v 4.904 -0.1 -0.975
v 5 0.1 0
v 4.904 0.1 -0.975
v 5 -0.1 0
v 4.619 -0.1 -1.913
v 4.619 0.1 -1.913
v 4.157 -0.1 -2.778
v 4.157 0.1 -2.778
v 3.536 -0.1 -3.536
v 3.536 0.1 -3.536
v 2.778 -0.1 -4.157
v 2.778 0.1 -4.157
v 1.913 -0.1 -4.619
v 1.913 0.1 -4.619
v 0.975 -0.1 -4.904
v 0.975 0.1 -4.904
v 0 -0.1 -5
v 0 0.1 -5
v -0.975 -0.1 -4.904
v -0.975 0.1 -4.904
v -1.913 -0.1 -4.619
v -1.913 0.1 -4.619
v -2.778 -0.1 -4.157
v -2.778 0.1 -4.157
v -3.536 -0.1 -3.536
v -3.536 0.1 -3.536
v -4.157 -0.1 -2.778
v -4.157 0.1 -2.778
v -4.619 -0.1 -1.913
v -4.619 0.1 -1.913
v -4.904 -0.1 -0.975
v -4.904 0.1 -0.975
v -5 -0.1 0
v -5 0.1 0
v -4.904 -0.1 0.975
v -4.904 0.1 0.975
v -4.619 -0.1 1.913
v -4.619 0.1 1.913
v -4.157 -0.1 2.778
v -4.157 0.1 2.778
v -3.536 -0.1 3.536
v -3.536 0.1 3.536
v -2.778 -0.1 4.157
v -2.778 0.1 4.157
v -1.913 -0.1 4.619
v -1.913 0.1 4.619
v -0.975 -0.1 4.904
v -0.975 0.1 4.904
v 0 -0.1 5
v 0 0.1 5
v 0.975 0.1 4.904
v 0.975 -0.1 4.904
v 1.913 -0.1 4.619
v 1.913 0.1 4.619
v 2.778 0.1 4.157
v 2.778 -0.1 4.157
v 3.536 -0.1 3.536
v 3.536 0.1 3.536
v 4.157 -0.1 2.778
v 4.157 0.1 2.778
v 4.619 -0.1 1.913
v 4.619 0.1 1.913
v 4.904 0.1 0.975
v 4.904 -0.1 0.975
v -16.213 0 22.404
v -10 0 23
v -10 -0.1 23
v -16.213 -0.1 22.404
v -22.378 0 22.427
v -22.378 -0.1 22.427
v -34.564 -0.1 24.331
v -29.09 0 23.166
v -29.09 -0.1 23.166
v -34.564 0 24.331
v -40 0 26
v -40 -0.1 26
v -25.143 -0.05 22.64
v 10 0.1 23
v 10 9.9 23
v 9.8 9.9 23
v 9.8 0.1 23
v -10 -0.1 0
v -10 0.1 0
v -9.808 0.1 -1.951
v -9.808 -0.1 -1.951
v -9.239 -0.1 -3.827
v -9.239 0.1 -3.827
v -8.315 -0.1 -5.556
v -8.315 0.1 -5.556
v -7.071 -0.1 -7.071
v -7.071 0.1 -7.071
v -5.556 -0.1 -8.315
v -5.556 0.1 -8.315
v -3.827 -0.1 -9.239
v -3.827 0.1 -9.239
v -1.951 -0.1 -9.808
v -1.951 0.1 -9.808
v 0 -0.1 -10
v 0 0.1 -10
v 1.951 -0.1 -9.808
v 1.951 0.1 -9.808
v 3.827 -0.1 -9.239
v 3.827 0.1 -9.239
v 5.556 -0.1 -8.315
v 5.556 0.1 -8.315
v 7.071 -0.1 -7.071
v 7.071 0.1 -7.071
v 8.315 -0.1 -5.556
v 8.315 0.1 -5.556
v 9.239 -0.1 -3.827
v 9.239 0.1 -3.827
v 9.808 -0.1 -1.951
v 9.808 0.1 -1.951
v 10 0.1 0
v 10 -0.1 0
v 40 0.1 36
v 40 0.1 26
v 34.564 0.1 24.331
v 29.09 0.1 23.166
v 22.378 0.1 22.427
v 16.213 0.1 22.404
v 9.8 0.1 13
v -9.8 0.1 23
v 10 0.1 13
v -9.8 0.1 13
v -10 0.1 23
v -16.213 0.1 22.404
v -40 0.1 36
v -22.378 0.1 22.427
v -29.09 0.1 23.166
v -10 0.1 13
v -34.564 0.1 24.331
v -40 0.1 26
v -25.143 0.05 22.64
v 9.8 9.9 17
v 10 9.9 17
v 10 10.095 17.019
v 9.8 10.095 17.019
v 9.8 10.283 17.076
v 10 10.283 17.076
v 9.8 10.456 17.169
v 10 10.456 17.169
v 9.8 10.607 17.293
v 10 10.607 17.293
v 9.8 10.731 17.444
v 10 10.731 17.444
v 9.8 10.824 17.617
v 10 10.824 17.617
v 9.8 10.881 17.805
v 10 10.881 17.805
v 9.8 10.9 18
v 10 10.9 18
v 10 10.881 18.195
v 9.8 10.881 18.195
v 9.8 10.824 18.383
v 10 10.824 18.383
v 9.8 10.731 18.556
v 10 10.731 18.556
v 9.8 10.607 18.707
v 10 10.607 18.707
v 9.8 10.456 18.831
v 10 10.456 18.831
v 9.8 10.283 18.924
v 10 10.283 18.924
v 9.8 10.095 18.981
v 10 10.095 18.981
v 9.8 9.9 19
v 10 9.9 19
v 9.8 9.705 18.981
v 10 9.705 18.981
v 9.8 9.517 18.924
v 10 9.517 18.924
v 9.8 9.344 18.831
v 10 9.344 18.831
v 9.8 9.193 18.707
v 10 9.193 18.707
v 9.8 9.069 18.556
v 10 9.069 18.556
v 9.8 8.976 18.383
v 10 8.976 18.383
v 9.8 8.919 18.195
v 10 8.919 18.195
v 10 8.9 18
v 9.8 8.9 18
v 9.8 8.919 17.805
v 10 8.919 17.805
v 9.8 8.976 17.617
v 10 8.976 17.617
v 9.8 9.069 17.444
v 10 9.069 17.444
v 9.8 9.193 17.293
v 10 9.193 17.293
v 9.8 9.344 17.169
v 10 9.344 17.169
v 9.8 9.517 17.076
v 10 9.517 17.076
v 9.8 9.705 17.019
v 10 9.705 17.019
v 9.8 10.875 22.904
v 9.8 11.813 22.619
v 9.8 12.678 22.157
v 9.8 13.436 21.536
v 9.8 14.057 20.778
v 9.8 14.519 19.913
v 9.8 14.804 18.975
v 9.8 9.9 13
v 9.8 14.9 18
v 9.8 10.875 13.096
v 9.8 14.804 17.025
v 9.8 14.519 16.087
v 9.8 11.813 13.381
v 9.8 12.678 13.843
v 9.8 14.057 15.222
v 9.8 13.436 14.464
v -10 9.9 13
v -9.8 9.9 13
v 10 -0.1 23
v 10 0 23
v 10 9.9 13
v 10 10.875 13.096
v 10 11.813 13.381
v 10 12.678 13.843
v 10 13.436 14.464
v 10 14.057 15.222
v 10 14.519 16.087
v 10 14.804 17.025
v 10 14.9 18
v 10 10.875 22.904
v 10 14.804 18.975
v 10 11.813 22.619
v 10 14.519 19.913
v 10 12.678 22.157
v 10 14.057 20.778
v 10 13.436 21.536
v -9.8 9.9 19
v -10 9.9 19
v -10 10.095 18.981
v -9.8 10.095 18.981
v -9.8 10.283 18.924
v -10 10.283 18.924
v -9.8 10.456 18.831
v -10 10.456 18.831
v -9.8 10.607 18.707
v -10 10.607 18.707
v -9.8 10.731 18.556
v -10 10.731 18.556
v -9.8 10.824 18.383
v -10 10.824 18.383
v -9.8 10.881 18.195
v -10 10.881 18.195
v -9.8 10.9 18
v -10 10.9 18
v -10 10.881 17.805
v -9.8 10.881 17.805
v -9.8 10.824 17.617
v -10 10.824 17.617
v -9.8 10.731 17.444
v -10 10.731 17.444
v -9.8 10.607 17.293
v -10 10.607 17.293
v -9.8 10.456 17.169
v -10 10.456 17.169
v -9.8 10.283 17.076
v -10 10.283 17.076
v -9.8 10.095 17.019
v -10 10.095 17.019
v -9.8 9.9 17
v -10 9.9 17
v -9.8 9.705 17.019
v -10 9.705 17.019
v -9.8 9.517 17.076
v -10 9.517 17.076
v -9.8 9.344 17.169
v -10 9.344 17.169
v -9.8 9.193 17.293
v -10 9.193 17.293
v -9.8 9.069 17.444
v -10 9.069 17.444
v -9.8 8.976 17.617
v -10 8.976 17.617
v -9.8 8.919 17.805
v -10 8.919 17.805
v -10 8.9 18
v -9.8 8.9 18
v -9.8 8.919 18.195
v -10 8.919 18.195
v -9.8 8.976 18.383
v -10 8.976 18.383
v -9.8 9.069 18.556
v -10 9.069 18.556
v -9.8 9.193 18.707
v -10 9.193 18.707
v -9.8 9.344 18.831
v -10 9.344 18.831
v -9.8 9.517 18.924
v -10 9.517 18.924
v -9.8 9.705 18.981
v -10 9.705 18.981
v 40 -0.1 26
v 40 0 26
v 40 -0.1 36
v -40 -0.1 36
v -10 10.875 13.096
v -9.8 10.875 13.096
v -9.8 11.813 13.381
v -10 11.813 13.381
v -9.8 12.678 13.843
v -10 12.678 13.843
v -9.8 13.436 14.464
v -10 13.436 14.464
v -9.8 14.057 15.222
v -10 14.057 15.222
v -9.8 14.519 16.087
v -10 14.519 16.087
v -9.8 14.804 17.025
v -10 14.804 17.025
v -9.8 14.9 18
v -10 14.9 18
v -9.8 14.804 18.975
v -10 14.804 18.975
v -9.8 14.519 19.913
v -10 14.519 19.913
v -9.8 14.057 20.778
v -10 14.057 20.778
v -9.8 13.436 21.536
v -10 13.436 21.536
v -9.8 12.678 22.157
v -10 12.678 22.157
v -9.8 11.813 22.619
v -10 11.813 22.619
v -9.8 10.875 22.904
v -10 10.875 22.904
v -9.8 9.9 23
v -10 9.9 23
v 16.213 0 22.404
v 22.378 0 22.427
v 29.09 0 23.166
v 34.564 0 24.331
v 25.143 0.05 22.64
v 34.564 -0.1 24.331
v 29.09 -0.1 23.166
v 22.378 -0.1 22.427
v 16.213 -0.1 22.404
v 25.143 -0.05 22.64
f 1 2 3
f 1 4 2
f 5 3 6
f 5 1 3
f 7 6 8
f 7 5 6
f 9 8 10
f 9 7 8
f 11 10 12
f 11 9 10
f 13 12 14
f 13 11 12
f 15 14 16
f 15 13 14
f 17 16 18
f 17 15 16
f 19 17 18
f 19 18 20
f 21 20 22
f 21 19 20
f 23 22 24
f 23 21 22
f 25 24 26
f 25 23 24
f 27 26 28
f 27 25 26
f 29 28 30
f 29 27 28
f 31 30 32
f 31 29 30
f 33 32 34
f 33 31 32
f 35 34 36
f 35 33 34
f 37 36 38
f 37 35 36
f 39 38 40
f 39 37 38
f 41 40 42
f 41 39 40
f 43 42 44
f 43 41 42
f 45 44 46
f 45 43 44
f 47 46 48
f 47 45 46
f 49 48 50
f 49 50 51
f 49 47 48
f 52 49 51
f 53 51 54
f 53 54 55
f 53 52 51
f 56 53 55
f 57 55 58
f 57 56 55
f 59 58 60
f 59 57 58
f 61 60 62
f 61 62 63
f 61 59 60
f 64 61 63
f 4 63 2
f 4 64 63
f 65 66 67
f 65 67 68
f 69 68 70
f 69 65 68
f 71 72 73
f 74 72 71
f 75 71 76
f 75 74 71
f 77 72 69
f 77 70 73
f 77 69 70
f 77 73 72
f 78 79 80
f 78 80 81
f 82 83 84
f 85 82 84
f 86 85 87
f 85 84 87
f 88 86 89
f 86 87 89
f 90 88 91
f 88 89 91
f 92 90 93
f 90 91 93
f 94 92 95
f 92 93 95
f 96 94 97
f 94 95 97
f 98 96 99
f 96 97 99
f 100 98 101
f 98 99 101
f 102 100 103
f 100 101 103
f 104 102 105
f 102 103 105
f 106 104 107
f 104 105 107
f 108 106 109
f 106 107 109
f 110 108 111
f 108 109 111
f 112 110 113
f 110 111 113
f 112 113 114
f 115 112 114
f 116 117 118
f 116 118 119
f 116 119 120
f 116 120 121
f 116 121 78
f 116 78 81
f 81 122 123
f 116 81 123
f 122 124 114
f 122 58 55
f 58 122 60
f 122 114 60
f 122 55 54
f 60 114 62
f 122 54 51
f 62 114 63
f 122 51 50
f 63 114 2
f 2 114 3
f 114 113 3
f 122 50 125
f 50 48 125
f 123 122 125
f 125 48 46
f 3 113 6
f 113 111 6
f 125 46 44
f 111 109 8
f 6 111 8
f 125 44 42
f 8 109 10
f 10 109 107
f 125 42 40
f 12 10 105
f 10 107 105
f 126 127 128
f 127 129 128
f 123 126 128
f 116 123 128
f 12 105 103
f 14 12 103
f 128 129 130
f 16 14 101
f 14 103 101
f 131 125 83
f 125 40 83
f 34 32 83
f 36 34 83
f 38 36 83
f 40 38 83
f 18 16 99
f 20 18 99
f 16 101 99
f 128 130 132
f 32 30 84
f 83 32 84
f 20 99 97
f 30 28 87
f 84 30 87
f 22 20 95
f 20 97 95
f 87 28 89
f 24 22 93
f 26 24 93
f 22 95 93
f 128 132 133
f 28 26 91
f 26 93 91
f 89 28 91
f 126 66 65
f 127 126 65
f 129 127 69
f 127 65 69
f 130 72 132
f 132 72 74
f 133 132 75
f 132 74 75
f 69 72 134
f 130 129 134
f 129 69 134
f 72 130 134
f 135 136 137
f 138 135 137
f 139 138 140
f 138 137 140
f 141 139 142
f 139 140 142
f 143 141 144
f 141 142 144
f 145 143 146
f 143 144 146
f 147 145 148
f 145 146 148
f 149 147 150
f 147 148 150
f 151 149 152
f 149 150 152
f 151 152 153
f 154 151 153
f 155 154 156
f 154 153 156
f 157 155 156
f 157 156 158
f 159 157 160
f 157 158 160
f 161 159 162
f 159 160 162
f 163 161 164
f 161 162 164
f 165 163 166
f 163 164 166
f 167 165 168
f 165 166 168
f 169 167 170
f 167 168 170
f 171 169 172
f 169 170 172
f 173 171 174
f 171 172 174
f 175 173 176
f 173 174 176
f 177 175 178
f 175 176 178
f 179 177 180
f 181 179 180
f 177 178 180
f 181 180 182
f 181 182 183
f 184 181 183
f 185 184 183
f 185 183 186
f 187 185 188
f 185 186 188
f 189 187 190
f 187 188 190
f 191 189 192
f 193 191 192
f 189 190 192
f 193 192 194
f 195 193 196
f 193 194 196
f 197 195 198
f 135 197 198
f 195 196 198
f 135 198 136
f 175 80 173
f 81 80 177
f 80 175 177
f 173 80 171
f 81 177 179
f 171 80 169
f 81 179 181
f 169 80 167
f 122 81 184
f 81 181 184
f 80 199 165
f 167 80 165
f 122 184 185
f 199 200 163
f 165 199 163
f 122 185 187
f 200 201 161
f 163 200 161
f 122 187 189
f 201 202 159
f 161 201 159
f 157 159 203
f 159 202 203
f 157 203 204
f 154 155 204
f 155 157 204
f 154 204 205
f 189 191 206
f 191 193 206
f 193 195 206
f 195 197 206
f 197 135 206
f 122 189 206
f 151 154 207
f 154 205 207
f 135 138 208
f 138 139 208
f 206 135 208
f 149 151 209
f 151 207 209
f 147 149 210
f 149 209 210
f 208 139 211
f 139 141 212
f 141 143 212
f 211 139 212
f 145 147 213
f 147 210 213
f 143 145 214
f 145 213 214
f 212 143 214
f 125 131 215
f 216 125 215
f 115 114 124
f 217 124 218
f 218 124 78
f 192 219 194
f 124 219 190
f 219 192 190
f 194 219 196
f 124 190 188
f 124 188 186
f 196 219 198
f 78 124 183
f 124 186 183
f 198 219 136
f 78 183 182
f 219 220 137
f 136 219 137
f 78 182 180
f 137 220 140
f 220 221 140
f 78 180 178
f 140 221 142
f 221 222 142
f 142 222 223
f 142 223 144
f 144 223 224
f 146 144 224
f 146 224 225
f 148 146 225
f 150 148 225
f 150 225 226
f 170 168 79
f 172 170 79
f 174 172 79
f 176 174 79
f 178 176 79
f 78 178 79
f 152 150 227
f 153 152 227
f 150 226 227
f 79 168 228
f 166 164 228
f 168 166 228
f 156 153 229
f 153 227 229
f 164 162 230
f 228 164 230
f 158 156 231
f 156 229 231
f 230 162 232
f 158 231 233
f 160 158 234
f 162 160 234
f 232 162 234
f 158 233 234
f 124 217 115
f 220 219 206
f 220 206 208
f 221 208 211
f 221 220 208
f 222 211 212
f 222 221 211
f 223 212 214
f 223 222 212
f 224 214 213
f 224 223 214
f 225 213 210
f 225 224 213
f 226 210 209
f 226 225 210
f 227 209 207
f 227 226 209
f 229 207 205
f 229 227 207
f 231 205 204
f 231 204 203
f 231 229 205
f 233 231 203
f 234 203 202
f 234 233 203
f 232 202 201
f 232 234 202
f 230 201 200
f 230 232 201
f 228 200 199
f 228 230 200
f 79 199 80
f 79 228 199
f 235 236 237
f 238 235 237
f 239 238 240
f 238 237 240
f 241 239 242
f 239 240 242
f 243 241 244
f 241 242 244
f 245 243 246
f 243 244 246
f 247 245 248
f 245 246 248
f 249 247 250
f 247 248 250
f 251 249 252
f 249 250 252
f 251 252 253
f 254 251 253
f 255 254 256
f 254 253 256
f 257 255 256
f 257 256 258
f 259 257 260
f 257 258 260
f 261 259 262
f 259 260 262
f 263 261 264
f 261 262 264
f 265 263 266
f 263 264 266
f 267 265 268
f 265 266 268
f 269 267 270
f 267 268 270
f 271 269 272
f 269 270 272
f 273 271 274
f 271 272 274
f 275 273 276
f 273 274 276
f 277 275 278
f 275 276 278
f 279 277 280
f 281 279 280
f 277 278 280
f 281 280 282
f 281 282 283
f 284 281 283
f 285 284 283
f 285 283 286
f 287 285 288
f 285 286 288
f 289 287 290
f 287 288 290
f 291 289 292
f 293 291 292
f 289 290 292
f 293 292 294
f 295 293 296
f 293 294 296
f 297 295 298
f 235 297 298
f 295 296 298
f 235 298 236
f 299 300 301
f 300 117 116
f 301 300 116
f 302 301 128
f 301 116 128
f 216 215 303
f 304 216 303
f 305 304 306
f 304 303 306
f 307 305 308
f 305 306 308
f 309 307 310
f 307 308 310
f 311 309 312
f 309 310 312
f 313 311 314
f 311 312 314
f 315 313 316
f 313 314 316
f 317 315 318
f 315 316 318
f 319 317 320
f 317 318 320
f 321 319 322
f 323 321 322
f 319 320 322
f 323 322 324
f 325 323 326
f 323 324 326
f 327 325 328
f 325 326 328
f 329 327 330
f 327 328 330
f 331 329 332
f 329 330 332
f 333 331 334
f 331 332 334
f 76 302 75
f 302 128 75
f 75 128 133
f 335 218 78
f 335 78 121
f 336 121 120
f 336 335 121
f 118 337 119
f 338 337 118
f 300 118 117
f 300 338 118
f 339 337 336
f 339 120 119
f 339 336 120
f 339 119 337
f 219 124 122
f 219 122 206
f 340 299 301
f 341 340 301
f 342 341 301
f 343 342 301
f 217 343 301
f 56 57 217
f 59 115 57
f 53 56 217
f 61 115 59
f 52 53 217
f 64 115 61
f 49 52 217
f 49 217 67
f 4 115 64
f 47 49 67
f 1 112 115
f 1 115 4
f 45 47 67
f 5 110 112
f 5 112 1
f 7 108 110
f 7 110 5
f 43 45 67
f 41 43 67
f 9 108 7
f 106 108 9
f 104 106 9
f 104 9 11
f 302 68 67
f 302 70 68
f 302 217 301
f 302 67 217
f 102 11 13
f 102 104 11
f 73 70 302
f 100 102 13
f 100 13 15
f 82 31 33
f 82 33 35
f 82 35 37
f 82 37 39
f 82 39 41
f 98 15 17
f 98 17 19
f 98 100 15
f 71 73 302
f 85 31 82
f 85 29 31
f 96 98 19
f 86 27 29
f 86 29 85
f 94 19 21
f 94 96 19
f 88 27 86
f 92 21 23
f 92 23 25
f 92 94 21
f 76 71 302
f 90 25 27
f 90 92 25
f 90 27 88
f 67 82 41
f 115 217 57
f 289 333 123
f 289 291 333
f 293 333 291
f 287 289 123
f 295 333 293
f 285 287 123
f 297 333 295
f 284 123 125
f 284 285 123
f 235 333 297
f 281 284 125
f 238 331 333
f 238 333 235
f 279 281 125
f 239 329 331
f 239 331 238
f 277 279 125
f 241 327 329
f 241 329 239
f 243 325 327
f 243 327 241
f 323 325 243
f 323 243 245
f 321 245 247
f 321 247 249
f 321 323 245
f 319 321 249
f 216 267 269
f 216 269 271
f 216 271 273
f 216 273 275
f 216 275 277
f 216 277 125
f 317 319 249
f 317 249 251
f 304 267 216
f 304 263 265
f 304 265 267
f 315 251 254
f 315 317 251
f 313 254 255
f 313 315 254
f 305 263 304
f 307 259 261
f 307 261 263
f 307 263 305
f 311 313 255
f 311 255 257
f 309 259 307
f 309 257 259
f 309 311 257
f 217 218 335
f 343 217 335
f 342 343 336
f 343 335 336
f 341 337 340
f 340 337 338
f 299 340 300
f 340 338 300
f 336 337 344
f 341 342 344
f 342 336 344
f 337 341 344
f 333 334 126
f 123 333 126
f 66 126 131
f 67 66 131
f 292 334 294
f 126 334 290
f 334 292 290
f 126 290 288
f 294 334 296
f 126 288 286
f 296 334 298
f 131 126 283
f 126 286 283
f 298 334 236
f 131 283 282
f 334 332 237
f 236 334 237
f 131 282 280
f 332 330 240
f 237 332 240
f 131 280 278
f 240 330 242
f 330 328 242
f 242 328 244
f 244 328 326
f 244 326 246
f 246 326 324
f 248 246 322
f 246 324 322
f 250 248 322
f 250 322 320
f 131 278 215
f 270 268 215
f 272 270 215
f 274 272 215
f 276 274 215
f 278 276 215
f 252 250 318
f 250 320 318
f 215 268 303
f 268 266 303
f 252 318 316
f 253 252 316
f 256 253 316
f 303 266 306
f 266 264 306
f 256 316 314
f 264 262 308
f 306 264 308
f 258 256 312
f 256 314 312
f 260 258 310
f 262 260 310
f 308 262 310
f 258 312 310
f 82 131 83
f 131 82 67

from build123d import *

# Parameters (mm, degrees)
SKETCH_1_R      = 5
EXTRUDE_1_DEPTH = 0.1
SKETCH_3_R      = 1
EXTRUDE_2_DEPTH = 0.2
SKETCH_4_R      = 1
EXTRUDE_3_DEPTH = 0.2


with BuildPart() as part:
    # 草图1 → 凸台-拉伸1 (new body, symmetric)
    with BuildSketch(Plane(origin=(0, 0, 0), x_dir=(1, 0, 0), z_dir=(0, 1, 0))):
        with BuildLine():
            Line((10, 0), (10, -23))
            add(Edge.make_bspline(
                [(10, -23), (25.285299712, -20.780872621), (40, -26)],
                knots=[0, 0, 0, 1, 1, 1], degree=2))
            Line((40, -26), (40, -36))
            Line((40, -36), (-40, -36))
            Line((-40, -36), (-40, -26))
            add(Edge.make_bspline(
                [(-10, -23), (-25.285299712, -20.780872621), (-40, -26)],
                knots=[0, 0, 0, 1, 1, 1], degree=2))
            Line((-10, -23), (-10, 0))
            ThreePointArc((-10, 0), (0, 10), (10, 0))
        make_face()
        Circle(SKETCH_1_R, mode=Mode.SUBTRACT)
    extrude(amount=EXTRUDE_1_DEPTH, both=True)

    # 草图3 → 凸台-拉伸2 (add)
    with BuildSketch(Plane(origin=(10, 0, 0), x_dir=(0, 0, -1), z_dir=(1, 0, 0))):
        with BuildLine():
            Line((-23, -0.1), (-13, -0.1))
            Line((-13, -0.1), (-13, 9.9))
            ThreePointArc((-13, 9.9), (-18, 14.9), (-23, 9.9))
            Line((-23, 9.9), (-23, -0.1))
        make_face()
        with Locations((-18, 9.9)):
            Circle(SKETCH_3_R, mode=Mode.SUBTRACT)
    extrude(amount=-EXTRUDE_2_DEPTH)

    # 草图4 → 凸台-拉伸3 (add)
    with BuildSketch(Plane.ZY.offset(10)):
        with BuildLine():
            Line((23, -0.1), (13, -0.1))
            Line((13, -0.1), (13, 9.9))
            ThreePointArc((13, 9.9), (18, 14.9), (23, 9.9))
            Line((23, 9.9), (23, -0.1))
        make_face()
        with Locations((18, 9.9)):
            Circle(SKETCH_4_R, mode=Mode.SUBTRACT)
    extrude(amount=-EXTRUDE_3_DEPTH)


solid = part.part
